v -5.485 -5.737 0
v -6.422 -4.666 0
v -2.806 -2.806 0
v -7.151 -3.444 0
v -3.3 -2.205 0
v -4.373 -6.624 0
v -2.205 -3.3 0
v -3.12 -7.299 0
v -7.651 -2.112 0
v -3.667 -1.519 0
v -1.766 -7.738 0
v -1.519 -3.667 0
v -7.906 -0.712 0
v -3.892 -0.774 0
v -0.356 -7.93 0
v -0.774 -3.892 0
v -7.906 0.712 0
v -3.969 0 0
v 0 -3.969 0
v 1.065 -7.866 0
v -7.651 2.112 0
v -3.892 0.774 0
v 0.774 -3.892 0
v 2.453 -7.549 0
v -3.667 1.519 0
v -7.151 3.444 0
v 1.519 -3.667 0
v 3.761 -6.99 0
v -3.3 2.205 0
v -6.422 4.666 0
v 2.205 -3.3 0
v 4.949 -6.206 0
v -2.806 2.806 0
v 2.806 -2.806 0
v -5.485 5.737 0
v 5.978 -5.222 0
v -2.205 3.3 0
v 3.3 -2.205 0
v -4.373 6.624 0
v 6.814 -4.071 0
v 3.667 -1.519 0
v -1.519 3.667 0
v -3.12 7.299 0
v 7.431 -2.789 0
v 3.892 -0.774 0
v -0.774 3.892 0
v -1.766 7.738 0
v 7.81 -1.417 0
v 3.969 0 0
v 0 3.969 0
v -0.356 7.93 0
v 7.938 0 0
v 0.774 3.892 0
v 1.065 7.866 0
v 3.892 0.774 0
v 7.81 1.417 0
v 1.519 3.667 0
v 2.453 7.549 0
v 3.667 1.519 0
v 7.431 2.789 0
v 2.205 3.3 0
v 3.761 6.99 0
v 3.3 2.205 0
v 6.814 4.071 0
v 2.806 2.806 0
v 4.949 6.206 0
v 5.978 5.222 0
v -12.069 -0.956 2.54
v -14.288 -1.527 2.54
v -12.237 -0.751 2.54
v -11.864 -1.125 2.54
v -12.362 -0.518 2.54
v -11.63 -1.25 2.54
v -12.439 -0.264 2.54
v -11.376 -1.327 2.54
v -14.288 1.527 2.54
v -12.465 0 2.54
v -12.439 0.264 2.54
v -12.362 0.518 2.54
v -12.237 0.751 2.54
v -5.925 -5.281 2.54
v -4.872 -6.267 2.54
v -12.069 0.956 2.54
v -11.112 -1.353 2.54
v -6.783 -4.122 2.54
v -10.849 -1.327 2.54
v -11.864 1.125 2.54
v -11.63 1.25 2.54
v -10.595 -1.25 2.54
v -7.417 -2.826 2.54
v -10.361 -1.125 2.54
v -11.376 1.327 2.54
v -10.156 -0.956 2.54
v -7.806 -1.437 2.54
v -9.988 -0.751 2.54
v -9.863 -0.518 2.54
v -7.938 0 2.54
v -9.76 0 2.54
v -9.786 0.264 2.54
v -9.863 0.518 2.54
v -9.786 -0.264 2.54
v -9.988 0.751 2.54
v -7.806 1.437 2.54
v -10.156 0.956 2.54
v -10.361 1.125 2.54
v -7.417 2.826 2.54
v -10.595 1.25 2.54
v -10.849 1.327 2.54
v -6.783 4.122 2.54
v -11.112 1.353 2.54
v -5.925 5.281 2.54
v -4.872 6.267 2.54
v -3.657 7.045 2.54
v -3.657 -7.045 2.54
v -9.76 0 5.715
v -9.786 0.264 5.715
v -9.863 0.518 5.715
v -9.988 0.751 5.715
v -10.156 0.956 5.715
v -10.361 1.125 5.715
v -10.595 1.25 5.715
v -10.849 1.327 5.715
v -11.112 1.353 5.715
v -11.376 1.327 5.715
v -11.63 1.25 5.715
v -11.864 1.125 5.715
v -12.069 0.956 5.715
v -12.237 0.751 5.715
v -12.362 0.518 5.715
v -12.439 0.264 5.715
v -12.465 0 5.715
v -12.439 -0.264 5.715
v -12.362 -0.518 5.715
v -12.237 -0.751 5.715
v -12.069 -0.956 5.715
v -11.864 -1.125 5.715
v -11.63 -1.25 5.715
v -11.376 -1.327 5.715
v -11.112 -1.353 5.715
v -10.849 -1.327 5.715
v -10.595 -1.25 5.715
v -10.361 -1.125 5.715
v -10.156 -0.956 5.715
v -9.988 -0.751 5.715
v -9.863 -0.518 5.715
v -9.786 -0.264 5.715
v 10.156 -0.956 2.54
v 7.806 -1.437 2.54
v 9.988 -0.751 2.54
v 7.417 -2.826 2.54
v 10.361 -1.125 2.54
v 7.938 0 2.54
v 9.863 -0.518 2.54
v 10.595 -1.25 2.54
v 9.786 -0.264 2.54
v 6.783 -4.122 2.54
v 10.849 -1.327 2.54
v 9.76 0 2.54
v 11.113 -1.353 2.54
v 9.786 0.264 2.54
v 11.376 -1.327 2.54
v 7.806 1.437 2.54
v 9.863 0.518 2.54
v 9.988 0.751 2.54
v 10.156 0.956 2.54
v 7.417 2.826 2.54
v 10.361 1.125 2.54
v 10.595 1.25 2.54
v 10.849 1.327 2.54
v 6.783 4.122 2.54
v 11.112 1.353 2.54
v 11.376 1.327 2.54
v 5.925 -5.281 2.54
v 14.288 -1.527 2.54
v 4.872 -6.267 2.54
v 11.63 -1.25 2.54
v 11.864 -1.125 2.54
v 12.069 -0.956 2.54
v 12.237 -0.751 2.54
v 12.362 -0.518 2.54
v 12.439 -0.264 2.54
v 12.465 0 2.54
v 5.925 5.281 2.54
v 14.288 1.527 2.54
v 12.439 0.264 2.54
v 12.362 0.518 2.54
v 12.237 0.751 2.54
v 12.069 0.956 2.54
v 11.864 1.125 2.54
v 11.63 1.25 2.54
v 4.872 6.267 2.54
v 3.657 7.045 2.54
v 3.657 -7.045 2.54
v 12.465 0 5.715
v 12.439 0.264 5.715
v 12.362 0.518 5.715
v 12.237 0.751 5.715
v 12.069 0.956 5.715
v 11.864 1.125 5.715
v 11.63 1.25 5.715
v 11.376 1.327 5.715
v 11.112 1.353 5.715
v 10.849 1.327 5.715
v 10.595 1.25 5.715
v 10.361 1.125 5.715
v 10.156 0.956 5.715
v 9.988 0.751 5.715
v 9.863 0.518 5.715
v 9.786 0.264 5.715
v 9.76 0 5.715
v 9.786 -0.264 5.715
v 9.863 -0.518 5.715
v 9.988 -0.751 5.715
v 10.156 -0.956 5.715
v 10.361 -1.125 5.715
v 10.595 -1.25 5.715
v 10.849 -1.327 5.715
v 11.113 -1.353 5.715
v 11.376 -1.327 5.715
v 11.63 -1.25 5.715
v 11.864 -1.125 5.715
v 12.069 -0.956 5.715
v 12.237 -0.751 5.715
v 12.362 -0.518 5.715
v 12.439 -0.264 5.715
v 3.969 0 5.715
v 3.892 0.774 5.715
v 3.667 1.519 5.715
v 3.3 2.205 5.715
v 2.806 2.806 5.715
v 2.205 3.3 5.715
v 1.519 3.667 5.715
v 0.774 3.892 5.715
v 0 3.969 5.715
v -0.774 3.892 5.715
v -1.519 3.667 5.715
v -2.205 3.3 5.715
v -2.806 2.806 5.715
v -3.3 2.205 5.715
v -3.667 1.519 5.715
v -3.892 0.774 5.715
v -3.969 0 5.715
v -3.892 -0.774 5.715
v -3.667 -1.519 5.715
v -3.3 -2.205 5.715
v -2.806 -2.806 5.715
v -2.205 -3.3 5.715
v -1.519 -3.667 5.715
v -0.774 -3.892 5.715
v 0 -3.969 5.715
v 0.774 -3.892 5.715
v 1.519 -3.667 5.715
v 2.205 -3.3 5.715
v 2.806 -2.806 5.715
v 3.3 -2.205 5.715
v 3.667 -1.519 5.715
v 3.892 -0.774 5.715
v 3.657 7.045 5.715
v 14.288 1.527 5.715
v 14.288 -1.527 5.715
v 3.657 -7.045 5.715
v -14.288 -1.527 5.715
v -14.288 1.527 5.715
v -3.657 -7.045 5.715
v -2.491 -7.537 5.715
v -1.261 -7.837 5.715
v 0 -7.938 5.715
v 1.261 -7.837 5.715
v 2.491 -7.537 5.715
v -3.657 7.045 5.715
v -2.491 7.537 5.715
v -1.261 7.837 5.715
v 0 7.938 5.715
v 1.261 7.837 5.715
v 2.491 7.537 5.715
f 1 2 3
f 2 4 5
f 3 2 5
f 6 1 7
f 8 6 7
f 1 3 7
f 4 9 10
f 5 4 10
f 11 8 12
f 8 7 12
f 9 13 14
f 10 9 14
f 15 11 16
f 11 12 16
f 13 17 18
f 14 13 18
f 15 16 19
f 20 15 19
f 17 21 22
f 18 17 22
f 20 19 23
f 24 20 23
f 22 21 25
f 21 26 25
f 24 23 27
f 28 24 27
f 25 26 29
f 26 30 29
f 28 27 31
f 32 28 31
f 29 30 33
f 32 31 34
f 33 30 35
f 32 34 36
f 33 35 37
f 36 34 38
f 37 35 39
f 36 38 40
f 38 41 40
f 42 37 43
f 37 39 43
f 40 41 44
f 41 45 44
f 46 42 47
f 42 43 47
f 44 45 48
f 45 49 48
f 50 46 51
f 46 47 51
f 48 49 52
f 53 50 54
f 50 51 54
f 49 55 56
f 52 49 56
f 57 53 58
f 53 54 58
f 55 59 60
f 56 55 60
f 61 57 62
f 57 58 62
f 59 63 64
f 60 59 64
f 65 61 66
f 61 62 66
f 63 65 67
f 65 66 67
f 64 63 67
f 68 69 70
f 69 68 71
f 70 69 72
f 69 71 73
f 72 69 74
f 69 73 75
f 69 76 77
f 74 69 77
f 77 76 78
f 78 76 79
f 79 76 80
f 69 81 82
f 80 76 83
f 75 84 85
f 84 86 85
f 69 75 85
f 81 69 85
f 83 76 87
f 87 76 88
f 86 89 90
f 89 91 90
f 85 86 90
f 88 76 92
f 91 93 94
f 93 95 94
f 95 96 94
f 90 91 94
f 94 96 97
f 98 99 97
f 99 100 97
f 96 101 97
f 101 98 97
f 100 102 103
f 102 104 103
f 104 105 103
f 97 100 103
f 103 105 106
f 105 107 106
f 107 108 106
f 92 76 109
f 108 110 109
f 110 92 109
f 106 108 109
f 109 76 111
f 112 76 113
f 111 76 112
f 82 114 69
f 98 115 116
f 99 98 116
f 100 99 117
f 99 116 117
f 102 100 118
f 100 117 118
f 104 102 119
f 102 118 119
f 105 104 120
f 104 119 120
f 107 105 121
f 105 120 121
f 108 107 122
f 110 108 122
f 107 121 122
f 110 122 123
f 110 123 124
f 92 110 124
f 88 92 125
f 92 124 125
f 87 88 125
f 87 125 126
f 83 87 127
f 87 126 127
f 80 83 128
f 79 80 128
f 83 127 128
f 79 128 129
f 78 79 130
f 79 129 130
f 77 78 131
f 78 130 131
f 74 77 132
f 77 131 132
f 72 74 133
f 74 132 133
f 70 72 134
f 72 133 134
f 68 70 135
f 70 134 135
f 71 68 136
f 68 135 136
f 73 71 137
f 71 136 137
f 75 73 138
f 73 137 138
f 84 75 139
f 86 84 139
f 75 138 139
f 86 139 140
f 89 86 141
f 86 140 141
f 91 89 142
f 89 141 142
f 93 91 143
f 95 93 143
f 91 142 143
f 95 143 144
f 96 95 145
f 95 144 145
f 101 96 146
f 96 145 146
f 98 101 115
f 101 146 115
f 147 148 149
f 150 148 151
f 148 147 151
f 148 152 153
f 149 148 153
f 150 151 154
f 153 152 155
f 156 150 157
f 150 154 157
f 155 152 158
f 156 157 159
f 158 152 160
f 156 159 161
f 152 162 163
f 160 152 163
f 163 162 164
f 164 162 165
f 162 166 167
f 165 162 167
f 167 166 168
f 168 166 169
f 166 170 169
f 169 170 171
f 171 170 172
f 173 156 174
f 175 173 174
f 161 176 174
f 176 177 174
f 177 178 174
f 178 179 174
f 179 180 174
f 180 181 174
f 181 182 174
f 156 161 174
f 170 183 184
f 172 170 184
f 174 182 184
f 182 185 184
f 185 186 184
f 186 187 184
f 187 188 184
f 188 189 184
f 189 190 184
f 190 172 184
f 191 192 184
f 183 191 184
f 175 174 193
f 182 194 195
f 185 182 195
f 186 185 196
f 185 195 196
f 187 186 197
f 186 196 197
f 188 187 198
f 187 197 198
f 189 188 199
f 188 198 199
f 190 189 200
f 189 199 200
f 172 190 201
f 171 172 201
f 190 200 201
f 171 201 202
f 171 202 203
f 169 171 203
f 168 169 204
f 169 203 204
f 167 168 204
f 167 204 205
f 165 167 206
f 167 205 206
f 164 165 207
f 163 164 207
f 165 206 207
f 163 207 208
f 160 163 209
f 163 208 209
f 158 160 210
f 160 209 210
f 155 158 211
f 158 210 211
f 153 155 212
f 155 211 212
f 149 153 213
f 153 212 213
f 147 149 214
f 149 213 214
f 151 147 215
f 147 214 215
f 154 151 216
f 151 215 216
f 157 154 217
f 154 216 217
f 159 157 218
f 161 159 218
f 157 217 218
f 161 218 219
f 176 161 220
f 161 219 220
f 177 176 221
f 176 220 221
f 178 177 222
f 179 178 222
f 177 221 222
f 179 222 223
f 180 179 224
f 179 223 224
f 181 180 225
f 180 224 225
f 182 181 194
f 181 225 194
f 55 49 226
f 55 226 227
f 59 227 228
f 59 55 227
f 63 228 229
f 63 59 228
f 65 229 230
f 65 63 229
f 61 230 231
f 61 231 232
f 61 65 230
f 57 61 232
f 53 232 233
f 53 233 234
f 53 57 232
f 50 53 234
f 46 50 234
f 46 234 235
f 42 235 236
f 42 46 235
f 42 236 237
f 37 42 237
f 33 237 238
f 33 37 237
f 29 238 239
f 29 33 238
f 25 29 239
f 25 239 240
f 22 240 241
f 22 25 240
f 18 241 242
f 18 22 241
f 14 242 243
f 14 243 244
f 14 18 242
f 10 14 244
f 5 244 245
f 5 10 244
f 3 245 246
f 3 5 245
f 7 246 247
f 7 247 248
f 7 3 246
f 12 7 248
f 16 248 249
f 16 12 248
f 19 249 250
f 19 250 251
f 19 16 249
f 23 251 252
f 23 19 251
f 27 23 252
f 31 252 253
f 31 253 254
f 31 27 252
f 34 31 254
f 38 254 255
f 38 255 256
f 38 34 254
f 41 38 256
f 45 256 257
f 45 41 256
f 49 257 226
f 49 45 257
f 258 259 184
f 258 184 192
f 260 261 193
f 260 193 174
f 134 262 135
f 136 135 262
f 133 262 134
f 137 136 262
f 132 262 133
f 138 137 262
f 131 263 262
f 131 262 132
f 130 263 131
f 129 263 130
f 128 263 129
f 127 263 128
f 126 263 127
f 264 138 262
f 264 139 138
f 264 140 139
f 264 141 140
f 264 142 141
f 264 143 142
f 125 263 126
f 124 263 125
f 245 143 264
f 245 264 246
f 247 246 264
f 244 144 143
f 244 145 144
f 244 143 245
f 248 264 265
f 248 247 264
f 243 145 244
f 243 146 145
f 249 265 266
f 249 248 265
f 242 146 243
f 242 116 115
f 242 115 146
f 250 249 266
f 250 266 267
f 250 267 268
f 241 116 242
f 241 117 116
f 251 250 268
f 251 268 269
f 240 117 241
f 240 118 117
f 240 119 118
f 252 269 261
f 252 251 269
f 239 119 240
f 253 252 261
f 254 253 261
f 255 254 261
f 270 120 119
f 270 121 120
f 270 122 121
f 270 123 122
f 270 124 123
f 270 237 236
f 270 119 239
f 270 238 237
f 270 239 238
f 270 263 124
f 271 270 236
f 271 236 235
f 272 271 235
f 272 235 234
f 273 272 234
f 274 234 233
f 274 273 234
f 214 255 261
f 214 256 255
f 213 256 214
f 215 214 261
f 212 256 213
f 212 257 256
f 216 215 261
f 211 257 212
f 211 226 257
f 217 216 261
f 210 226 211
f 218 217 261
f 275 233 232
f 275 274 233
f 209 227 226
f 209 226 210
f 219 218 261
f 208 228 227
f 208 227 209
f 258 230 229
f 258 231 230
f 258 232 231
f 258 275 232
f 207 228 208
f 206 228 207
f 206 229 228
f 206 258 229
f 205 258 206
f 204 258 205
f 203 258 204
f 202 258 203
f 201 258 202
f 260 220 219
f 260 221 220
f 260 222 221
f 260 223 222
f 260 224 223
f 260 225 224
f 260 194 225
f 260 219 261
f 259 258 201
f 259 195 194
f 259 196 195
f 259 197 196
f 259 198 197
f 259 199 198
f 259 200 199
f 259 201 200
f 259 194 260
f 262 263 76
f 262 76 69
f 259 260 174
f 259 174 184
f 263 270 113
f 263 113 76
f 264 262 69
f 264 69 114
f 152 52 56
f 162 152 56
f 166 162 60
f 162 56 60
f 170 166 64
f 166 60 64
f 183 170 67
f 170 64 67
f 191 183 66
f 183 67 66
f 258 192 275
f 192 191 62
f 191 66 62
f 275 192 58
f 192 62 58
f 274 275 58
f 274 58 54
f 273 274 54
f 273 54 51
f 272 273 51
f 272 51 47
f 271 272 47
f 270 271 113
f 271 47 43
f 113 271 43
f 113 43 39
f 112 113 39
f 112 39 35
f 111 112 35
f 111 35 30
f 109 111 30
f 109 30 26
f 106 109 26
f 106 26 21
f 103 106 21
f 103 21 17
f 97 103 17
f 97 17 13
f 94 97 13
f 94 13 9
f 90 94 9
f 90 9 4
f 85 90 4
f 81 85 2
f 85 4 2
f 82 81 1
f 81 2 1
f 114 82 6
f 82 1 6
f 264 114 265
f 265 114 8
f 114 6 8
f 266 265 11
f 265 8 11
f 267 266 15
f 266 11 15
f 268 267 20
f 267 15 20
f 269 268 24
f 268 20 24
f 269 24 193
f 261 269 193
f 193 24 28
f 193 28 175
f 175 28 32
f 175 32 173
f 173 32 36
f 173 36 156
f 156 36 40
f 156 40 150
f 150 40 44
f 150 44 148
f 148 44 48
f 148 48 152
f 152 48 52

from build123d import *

# Parameters (mm, degrees)
F0_R     = 7.9375
F0_R_2   = 3.96875
F1_DEPTH = 5.715
F2_R     = 1.35255
F3_DEPTH = 3.175


with BuildPart() as f1:
    # F0 (on Top) → F1 (new body)
    with BuildSketch(Plane.XY):
        Circle(F0_R)
        Circle(F0_R_2, mode=Mode.SUBTRACT)
    extrude(amount=F1_DEPTH)

    # F2 (on face) → F3 (join)
    with BuildSketch(Plane.XY.offset(5.715)):
        with BuildLine():
            Line((-3.65679, 7.044983), (-14.2875, 1.526975))
            Line((-14.2875, 1.526975), (-14.2875, -1.526975))
            Line((-14.2875, -1.526975), (-3.65679, -7.044983))
            ThreePointArc((-3.65679, -7.044983), (-7.9375, 0), (-3.65679, 7.044983))
        make_face()
        with Locations((-11.1125, 0)):
            Circle(F2_R, mode=Mode.SUBTRACT)
        with BuildLine():
            Line((14.2875, 1.526975), (3.65679, 7.044983))
            ThreePointArc((3.65679, 7.044983), (6.783424, 4.121779), (7.9375, 0))
            ThreePointArc((7.9375, 0), (6.783424, -4.121779), (3.65679, -7.044983))
            Line((3.65679, -7.044983), (14.2875, -1.526975))
            Line((14.2875, -1.526975), (14.2875, 1.526975))
        make_face()
        with Locations((11.1125, 0)):
            Circle(F2_R, mode=Mode.SUBTRACT)
    extrude(amount=-F3_DEPTH)


solid = f1.part
